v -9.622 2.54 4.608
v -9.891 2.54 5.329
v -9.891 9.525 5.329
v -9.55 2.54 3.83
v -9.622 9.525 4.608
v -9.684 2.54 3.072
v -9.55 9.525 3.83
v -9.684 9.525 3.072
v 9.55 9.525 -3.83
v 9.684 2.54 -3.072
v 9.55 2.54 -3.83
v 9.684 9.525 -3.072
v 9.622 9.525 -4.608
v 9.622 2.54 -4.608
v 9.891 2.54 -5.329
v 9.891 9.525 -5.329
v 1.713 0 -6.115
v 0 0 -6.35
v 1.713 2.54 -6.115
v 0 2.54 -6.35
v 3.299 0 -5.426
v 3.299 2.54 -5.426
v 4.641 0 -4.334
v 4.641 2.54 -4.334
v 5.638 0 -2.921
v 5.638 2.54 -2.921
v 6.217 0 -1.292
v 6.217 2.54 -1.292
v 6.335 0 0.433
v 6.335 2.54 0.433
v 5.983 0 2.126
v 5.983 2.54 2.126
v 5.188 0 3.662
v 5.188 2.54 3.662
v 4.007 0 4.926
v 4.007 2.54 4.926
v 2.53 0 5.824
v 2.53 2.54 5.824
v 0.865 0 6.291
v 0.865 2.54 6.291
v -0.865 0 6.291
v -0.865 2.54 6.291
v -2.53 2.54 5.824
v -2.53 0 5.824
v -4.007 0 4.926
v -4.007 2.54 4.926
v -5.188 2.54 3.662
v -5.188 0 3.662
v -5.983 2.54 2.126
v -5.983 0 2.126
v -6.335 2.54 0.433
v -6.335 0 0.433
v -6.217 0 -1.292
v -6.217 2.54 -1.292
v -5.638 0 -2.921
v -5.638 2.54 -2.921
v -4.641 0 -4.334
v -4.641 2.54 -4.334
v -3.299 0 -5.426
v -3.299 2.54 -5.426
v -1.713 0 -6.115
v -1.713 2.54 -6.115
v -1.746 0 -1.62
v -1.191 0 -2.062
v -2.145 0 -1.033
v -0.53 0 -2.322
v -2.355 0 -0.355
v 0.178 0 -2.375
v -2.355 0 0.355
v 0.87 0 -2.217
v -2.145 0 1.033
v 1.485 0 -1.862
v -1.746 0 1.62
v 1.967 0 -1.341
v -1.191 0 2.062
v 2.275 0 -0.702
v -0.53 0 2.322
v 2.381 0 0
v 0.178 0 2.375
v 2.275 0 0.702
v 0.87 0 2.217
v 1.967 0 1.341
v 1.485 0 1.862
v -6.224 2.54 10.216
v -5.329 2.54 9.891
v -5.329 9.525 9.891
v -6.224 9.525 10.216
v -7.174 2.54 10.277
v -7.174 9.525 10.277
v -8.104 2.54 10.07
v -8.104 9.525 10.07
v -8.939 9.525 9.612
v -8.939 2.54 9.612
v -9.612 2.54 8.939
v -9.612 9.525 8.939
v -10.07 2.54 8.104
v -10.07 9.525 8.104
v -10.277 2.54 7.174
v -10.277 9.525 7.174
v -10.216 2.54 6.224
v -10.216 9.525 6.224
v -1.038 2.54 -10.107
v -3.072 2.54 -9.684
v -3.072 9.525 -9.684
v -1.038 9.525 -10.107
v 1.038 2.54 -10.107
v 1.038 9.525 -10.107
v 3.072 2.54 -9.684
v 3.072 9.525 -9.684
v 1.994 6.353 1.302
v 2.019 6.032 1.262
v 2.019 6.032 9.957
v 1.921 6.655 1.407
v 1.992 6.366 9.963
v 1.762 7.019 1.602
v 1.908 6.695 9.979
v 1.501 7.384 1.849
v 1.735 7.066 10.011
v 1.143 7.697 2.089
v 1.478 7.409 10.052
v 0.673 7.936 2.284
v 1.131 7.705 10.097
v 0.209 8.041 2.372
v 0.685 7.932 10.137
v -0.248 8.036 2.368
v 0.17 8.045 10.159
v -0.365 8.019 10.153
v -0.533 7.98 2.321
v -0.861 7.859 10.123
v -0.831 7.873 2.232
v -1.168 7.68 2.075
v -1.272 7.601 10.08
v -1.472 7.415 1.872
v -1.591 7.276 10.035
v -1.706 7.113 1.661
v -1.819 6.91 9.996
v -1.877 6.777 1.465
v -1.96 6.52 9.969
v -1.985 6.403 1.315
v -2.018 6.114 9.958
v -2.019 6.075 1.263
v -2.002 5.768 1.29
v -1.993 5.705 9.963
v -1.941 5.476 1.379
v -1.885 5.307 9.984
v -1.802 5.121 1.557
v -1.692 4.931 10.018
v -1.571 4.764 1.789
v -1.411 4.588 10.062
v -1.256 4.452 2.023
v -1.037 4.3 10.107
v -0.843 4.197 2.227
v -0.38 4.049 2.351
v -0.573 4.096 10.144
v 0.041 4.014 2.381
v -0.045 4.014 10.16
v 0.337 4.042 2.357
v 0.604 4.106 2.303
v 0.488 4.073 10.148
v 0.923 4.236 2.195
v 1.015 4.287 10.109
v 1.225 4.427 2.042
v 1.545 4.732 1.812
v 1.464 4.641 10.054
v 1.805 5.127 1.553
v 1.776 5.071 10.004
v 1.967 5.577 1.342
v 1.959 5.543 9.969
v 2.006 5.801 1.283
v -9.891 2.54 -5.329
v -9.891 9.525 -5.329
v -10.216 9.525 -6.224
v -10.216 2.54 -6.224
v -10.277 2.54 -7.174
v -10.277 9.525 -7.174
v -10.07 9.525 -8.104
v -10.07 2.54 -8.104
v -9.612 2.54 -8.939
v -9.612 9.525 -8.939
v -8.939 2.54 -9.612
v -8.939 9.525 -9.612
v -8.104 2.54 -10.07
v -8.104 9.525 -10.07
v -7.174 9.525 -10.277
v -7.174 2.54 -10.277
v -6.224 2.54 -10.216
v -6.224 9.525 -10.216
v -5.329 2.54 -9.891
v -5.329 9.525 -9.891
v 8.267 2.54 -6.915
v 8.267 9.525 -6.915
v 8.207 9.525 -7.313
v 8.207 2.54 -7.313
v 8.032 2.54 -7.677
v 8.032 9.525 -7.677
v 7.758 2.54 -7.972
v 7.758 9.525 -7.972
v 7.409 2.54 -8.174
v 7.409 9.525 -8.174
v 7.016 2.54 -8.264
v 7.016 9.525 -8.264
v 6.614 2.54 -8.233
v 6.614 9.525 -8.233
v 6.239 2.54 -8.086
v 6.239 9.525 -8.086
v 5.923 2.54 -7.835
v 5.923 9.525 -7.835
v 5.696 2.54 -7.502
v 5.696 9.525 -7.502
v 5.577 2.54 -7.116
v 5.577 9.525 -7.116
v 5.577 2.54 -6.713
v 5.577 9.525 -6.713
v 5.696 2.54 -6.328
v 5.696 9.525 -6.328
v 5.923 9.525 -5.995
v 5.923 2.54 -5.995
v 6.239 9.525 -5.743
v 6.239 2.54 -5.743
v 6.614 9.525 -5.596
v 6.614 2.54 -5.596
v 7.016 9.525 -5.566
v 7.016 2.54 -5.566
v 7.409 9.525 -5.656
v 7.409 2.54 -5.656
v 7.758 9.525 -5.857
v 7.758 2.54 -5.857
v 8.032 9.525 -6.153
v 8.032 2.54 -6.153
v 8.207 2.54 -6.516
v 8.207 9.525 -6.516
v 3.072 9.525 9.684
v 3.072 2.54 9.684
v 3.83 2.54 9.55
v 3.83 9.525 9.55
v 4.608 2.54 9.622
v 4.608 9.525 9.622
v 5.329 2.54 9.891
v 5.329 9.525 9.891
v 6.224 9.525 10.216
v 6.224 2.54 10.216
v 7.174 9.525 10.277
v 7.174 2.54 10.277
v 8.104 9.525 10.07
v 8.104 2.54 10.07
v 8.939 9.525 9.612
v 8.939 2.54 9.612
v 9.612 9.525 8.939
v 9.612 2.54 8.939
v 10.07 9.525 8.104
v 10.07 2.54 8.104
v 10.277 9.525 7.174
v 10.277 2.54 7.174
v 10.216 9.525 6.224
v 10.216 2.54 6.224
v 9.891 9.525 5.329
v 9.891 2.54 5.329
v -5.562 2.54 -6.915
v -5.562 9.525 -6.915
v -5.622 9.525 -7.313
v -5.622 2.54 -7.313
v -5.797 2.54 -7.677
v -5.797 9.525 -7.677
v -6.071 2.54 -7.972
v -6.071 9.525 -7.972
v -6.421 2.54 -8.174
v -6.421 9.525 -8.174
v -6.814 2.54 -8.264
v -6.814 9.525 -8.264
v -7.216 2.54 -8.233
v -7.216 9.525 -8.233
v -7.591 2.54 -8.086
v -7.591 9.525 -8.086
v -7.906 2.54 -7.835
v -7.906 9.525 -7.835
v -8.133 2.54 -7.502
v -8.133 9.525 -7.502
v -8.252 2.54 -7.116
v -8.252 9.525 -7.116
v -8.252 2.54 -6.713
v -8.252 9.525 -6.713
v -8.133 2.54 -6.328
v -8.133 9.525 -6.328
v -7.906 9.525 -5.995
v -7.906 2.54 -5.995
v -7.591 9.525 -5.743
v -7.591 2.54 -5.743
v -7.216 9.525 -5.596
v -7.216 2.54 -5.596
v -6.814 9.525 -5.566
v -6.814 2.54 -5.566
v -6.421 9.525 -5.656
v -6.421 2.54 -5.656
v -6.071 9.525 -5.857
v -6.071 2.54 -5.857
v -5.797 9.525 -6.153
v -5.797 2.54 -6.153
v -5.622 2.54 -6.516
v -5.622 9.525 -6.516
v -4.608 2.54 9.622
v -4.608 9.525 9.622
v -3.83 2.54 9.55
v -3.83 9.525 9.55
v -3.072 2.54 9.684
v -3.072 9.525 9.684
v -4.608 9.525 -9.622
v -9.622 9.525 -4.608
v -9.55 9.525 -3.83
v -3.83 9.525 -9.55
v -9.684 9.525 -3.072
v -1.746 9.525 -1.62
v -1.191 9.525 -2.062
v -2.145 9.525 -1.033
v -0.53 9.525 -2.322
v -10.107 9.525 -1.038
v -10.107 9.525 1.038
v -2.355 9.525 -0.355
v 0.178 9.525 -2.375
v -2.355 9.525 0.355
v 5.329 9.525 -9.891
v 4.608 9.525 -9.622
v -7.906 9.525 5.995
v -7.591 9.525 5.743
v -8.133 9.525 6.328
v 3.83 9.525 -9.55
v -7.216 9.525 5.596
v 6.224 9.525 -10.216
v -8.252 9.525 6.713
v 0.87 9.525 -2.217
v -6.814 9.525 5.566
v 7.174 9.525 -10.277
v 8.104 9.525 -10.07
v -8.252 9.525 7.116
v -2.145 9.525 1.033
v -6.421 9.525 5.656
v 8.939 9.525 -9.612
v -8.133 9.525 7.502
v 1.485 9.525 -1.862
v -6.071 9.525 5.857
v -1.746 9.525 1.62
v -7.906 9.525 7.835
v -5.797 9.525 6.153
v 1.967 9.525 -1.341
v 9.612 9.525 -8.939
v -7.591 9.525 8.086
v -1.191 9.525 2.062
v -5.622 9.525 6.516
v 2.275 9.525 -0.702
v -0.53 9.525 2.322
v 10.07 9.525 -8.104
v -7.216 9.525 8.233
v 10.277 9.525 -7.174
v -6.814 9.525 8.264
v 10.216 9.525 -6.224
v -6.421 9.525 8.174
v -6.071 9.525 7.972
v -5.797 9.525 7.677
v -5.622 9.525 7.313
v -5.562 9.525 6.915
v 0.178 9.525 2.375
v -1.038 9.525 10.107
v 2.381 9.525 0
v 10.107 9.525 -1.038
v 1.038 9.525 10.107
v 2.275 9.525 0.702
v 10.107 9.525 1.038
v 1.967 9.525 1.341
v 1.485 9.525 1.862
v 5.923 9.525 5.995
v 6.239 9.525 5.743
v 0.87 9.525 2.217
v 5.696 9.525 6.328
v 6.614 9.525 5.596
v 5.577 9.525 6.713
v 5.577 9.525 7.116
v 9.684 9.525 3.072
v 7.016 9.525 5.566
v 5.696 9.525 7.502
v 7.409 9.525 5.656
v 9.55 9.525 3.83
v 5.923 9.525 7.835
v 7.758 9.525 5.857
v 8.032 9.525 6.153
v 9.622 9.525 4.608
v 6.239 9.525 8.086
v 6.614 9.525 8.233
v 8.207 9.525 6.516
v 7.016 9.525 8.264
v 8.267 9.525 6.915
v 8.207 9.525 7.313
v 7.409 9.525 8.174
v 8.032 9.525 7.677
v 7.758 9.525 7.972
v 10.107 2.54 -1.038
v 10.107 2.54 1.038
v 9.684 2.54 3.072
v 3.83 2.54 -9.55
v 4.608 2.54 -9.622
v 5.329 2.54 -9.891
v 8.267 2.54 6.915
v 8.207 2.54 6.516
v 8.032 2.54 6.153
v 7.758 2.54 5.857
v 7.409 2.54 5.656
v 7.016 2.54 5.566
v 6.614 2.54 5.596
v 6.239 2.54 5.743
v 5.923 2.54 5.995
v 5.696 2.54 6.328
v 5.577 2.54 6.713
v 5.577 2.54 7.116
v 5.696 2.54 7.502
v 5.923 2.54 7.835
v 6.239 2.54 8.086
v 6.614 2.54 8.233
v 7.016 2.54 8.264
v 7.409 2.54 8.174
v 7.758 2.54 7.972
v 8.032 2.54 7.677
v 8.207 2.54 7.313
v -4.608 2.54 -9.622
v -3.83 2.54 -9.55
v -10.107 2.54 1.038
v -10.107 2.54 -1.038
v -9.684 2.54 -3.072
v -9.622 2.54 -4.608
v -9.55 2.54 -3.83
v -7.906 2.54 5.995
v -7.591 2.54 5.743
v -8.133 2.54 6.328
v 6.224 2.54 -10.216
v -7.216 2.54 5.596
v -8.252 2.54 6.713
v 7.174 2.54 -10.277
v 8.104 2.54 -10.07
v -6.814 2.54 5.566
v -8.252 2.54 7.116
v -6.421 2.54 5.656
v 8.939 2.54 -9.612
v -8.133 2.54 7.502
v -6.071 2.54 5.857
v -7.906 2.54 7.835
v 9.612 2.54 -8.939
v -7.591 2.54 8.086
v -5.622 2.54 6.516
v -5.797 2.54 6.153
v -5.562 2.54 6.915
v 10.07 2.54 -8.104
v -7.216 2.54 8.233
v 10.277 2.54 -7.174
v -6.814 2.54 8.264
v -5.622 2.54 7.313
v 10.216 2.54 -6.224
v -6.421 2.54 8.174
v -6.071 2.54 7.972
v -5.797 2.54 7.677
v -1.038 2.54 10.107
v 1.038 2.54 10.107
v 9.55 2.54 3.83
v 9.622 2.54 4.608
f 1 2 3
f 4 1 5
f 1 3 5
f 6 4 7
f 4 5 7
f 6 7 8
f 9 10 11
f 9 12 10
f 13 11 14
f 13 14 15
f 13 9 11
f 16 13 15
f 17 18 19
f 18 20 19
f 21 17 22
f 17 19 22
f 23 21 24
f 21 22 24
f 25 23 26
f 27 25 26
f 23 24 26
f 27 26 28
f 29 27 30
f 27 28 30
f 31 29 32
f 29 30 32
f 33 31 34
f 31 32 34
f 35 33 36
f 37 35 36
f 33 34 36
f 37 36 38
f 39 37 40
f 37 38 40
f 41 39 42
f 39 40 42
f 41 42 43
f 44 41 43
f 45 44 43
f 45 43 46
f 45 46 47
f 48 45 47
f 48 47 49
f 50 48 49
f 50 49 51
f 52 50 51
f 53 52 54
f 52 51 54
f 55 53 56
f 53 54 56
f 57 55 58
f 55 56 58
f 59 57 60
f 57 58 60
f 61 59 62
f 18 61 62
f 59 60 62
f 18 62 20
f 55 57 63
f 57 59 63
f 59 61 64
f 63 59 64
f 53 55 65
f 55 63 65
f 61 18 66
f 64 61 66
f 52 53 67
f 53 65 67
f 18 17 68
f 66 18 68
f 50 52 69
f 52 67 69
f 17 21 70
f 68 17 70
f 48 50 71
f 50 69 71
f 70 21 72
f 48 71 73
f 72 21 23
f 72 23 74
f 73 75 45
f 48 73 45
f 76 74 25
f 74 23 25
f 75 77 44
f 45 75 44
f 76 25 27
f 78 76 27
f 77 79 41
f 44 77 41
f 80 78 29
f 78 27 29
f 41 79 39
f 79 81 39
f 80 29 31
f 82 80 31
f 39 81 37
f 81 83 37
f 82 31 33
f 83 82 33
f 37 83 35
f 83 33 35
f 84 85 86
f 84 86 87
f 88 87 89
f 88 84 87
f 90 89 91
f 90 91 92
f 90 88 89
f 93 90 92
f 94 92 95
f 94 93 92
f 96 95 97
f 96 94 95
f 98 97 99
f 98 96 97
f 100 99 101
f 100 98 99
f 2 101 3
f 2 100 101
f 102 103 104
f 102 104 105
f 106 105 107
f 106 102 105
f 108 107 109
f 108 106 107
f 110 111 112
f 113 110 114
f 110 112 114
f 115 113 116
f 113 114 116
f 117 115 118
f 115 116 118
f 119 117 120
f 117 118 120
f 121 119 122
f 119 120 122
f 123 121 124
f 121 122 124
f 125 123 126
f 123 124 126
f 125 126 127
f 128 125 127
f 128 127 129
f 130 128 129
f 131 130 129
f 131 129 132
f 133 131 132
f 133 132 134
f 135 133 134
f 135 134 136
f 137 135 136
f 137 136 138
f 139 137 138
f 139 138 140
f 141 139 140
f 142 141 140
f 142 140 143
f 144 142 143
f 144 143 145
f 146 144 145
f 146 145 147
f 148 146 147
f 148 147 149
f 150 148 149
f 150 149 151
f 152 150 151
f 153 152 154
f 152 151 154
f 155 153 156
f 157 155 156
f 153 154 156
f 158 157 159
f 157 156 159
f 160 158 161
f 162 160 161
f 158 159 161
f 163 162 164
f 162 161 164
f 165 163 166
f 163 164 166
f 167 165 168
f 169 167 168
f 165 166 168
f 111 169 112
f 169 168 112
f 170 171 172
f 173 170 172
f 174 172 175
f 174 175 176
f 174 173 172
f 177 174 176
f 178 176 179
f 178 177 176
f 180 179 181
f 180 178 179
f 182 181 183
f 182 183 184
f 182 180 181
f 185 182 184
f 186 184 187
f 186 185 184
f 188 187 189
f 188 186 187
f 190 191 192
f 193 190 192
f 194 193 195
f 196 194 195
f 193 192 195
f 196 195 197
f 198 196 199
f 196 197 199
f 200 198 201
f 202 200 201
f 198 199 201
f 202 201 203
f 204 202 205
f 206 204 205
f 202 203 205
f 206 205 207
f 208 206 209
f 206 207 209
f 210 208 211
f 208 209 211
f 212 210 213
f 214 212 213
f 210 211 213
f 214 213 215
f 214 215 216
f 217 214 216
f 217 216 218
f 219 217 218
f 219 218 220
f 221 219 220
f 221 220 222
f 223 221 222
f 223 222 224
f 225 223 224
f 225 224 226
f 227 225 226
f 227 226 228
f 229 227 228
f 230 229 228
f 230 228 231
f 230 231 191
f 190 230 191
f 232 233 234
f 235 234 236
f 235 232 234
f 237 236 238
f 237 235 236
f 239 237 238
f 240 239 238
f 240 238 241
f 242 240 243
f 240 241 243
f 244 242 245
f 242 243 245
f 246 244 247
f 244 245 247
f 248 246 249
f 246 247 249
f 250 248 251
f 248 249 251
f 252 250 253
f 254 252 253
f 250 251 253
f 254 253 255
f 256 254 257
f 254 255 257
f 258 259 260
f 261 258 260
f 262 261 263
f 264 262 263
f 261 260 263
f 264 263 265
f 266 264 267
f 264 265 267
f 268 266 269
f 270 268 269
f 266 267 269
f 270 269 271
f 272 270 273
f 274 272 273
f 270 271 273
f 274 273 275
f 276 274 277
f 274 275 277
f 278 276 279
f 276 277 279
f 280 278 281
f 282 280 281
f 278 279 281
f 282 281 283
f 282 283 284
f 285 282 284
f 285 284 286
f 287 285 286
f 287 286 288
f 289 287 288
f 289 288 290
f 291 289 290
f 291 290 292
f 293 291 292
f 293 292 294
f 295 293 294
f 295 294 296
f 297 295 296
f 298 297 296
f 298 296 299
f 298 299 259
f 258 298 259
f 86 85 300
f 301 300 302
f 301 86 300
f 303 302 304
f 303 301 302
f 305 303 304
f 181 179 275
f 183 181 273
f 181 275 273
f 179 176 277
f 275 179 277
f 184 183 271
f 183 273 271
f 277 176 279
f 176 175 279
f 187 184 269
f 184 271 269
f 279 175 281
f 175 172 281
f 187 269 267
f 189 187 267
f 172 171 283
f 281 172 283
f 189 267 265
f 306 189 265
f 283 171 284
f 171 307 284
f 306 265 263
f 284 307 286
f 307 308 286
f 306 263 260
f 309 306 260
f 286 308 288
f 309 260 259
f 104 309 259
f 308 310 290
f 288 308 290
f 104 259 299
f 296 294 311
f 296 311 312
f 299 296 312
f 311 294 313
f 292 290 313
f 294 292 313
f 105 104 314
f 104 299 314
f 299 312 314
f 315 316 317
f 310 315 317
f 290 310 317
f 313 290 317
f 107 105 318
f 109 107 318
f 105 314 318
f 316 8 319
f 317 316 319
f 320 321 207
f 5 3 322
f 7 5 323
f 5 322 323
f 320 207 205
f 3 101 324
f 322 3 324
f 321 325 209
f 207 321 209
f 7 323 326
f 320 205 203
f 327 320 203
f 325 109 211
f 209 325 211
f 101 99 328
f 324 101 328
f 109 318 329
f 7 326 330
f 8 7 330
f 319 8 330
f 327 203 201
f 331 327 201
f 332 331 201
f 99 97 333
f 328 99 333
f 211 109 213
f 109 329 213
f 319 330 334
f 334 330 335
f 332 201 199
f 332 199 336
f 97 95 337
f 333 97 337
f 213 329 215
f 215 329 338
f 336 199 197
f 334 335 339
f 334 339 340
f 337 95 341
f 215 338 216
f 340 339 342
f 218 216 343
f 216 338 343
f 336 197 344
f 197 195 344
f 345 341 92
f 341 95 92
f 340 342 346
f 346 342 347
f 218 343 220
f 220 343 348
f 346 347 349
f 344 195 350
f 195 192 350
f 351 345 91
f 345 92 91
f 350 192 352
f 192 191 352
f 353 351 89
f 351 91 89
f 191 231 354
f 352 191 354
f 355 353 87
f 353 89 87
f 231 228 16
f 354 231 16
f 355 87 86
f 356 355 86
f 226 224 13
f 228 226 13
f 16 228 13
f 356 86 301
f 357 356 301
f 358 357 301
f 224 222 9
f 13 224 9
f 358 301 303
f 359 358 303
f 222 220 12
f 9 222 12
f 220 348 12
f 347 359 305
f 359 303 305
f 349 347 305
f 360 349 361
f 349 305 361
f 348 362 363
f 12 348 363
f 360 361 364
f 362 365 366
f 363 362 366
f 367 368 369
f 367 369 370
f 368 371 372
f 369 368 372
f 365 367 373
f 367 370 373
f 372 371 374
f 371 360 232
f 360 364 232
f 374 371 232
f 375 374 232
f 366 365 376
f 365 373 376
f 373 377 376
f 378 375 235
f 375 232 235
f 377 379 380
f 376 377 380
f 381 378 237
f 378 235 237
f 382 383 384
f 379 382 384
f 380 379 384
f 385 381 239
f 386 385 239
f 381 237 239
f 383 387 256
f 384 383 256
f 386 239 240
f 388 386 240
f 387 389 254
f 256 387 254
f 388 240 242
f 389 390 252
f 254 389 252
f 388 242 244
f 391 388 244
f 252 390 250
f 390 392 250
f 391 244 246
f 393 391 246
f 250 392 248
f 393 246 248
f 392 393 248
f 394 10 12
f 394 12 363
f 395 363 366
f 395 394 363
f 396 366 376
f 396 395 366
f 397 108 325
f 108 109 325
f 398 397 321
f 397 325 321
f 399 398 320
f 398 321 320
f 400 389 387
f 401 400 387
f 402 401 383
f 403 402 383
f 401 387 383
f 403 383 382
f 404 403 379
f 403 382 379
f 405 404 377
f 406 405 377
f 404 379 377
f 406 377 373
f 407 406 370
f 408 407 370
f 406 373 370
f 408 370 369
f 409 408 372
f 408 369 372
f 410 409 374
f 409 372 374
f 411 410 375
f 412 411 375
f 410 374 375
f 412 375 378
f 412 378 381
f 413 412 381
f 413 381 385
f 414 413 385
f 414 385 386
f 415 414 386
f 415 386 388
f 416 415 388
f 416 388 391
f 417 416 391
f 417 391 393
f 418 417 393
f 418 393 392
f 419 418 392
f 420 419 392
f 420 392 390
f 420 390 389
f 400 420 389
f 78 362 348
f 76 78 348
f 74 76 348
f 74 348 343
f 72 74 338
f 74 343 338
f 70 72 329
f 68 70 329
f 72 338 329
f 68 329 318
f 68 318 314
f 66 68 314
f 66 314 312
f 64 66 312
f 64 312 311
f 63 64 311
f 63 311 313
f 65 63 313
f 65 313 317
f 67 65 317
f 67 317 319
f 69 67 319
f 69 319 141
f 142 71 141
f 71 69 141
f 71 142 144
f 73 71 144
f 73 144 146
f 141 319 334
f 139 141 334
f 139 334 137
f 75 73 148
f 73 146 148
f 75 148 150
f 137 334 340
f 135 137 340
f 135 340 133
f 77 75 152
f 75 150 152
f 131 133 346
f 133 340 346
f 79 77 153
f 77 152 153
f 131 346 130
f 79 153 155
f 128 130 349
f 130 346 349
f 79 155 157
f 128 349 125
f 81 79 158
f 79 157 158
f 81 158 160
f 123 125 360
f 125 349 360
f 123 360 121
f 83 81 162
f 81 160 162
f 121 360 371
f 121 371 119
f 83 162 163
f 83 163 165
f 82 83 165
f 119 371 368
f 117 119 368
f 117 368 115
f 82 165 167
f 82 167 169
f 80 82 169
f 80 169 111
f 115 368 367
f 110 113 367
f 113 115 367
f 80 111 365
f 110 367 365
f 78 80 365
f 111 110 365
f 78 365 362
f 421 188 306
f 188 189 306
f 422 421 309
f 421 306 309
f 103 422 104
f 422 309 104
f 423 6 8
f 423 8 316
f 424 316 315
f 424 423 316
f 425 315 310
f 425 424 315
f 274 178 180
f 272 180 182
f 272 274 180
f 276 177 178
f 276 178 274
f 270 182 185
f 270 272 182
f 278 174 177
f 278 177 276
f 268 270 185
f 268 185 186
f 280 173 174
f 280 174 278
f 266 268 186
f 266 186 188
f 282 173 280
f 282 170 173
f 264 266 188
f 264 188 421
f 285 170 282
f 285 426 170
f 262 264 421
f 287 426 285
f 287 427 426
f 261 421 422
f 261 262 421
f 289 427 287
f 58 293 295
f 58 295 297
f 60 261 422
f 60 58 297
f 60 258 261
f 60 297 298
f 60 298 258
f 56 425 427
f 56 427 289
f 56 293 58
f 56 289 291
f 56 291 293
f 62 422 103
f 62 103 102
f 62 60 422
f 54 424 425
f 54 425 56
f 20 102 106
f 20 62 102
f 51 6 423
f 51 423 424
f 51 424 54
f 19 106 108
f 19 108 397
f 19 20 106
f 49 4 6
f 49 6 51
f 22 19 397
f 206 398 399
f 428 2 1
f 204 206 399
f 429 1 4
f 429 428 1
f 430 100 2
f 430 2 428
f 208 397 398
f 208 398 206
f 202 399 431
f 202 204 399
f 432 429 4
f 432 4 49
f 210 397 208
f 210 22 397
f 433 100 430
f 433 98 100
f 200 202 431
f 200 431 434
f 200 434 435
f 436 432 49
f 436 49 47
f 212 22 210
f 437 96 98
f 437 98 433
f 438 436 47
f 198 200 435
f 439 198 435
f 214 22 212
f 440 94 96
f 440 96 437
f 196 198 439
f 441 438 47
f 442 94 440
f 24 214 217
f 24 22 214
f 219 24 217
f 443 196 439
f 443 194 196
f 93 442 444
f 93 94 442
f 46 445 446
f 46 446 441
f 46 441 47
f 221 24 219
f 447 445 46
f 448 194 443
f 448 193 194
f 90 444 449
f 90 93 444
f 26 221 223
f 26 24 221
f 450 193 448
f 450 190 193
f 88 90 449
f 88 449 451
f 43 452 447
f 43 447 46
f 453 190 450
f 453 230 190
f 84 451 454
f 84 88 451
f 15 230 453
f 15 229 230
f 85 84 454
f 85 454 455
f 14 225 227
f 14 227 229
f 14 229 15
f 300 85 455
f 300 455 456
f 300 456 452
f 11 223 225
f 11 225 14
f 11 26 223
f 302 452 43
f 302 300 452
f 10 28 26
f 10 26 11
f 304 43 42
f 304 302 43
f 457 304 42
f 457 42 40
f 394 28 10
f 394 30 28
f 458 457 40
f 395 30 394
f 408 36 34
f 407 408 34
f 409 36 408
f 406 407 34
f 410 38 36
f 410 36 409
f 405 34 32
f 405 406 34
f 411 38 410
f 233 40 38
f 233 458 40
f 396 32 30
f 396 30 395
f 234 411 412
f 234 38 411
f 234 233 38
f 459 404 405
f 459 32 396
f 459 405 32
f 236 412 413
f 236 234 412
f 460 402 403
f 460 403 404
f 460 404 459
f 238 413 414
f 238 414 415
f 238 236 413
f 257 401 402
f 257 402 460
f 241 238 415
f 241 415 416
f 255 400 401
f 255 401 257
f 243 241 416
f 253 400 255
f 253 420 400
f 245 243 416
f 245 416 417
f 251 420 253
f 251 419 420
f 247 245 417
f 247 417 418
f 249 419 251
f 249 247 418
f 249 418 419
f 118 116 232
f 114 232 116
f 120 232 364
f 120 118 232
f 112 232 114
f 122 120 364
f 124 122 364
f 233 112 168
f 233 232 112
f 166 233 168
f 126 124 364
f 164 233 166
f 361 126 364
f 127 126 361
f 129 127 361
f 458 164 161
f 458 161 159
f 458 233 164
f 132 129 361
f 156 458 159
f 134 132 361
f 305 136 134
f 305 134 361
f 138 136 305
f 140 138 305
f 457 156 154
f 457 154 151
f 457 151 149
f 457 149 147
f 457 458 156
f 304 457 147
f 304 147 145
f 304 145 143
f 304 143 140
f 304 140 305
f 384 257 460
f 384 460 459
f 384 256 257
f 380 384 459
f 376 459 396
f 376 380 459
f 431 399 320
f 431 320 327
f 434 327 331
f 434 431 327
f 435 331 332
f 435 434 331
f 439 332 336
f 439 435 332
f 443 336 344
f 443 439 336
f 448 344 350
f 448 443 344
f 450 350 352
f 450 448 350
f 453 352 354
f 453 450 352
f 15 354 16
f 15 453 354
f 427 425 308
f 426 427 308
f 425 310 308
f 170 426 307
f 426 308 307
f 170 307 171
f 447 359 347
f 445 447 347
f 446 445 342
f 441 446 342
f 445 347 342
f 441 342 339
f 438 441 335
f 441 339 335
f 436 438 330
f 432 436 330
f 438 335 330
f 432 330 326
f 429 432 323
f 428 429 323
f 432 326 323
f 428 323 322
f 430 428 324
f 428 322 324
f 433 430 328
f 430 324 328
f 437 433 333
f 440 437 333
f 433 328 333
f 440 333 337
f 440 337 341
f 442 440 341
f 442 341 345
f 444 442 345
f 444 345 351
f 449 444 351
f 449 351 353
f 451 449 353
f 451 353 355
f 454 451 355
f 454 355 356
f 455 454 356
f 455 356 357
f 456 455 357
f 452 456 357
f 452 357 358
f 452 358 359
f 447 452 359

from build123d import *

# Parameters (mm, degrees)
BOSS_EXTRUDE1_DEPTH         = 6.985
BOSS_EXTRUDE2_DEPTH         = 6.985
BOSS_EXTRUDE3_DEPTH         = 6.985
BOSS_EXTRUDE4_START         = -6.985
BOSS_EXTRUDE4_DEPTH         = 6.985
SKETCH5_W                   = 6.35
SKETCH5_H                   = 2.54
M2_5_CLEARANCE_HOLE1_D      = 2.7051
M4_CLEARANCE_HOLE1_D        = 4.7625
M3_5_CLEARANCE_HOLE1_REACH  = 25.671
M3_5_CLEARANCE_HOLE1_BORE_R = 2.0193
FILLET1_R                   = 2.921


with BuildPart() as part:
    # Sketch1 → Boss-Extrude1 (new body)
    with BuildSketch(Plane.XZ.offset(-2.54)):
        with BuildLine():
            ThreePointArc((-4.397716486, 9.158913129), (-9.299304671, 9.299304671), (-9.158913129, 4.397716486))
            ThreePointArc((-9.158913129, 4.397716486), (7.184204897, -7.184204897), (-4.397716486, 9.158913129))
        make_face()
    extrude(amount=-BOSS_EXTRUDE1_DEPTH)

    # Sketch2 → Boss-Extrude2 (add)
    with BuildSketch(Plane.XZ.offset(-2.54)):
        with BuildLine():
            ThreePointArc((-9.158913129, -4.397716486), (-9.299304671, -9.299304671), (-4.397716486, -9.158913129))
            ThreePointArc((-4.397716486, -9.158913129), (-7.184204897, -7.184204897), (-9.158913129, -4.397716486))
        make_face()
    extrude(amount=-BOSS_EXTRUDE2_DEPTH)

    # Sketch3 → Boss-Extrude3 (add)
    with BuildSketch(Plane.XZ.offset(-2.54)):
        with BuildLine():
            ThreePointArc((4.397716486, -9.158913129), (9.299304671, -9.299304671), (9.158913129, -4.397716486))
            ThreePointArc((9.158913129, -4.397716486), (7.184204897, -7.184204897), (4.397716486, -9.158913129))
        make_face()
    extrude(amount=-BOSS_EXTRUDE3_DEPTH)

    # Sketch4 → Boss-Extrude4 (add)
    with BuildSketch(Plane(origin=(0, 9.525, 0), x_dir=(1, 0, 0), z_dir=(0, 1, 0)).offset(BOSS_EXTRUDE4_START)):
        with BuildLine():
            ThreePointArc((9.158913129, -4.397716486), (7.184204897, -7.184204897), (4.397716486, -9.158913129))
            ThreePointArc((4.397716486, -9.158913129), (9.299304671, -9.299304671), (9.158913129, -4.397716486))
        make_face()
    extrude(amount=BOSS_EXTRUDE4_DEPTH)

    # Sketch5 → Revolve1 (revolve)
    with BuildSketch(Plane.XY, mode=Mode.PRIVATE) as revolve1_sk:
        with Locations((3.175, 1.27)):
            Rectangle(SKETCH5_W, SKETCH5_H)
    revolve(revolve1_sk.sketch.rotate(Axis((0, 2.54, 0), (0, -1, 0)), 270), axis=Axis((0, 2.54, 0), (0, -1, 0)))

    # M2.5 Clearance Hole1 (through all)
    with Locations(Plane(origin=(0, 2.54, 0), x_dir=(-1, 0, 0), z_dir=(0, -1, 0))):
        with Locations((-6.914797213, 6.914797213), (-6.914797213, -6.914797213), (6.914797213, -6.914797213), (6.914797213, 6.914797213)):
            Hole(M2_5_CLEARANCE_HOLE1_D / 2)

    # M4 Clearance Hole1 (through all)
    with Locations(Plane(origin=(0, 0, 0), x_dir=(-1, 0, 0), z_dir=(0, -1, 0))):
        with Locations((0, 0)):
            Hole(M4_CLEARANCE_HOLE1_D / 2)

    # M3.5 Clearance Hole1 bore (on position points) → M3.5 Clearance Hole1 (cut, up to next)
    with BuildSketch(Plane(origin=(0, 6.0325, 10.16), x_dir=(1, 0, 0), z_dir=(0, 0, 1)), mode=Mode.PRIVATE) as m3_5_clearance_hole1_sk1:
        Circle(M3_5_CLEARANCE_HOLE1_BORE_R)
    m3_5_clearance_hole1_tool1 = extrude(m3_5_clearance_hole1_sk1.sketch, amount=-M3_5_CLEARANCE_HOLE1_REACH, mode=Mode.PRIVATE) & part.part
    add(m3_5_clearance_hole1_tool1.solids().sort_by_distance((0, 6.0325, 10.16))[0], mode=Mode.SUBTRACT)

    # Fillet1
    fillet1_edges = [part.edges().sort_by_distance(p)[0] for p in [
        (-9.158913129, 6.0325, -4.397716486),
        (-4.397716486, 6.0325, -9.158913129),
        (4.397716486, 6.0325, -9.158913129),
        (9.158913129, 6.0325, -4.397716486),
        (9.158913129, 6.0325, 4.397716486),
        (4.397716486, 6.0325, 9.158913129),
        (-9.158913129, 6.0325, 4.397716486),
        (-4.397716486, 6.0325, 9.158913129),
    ]]
    fillet(fillet1_edges, radius=FILLET1_R)


solid = part.part
